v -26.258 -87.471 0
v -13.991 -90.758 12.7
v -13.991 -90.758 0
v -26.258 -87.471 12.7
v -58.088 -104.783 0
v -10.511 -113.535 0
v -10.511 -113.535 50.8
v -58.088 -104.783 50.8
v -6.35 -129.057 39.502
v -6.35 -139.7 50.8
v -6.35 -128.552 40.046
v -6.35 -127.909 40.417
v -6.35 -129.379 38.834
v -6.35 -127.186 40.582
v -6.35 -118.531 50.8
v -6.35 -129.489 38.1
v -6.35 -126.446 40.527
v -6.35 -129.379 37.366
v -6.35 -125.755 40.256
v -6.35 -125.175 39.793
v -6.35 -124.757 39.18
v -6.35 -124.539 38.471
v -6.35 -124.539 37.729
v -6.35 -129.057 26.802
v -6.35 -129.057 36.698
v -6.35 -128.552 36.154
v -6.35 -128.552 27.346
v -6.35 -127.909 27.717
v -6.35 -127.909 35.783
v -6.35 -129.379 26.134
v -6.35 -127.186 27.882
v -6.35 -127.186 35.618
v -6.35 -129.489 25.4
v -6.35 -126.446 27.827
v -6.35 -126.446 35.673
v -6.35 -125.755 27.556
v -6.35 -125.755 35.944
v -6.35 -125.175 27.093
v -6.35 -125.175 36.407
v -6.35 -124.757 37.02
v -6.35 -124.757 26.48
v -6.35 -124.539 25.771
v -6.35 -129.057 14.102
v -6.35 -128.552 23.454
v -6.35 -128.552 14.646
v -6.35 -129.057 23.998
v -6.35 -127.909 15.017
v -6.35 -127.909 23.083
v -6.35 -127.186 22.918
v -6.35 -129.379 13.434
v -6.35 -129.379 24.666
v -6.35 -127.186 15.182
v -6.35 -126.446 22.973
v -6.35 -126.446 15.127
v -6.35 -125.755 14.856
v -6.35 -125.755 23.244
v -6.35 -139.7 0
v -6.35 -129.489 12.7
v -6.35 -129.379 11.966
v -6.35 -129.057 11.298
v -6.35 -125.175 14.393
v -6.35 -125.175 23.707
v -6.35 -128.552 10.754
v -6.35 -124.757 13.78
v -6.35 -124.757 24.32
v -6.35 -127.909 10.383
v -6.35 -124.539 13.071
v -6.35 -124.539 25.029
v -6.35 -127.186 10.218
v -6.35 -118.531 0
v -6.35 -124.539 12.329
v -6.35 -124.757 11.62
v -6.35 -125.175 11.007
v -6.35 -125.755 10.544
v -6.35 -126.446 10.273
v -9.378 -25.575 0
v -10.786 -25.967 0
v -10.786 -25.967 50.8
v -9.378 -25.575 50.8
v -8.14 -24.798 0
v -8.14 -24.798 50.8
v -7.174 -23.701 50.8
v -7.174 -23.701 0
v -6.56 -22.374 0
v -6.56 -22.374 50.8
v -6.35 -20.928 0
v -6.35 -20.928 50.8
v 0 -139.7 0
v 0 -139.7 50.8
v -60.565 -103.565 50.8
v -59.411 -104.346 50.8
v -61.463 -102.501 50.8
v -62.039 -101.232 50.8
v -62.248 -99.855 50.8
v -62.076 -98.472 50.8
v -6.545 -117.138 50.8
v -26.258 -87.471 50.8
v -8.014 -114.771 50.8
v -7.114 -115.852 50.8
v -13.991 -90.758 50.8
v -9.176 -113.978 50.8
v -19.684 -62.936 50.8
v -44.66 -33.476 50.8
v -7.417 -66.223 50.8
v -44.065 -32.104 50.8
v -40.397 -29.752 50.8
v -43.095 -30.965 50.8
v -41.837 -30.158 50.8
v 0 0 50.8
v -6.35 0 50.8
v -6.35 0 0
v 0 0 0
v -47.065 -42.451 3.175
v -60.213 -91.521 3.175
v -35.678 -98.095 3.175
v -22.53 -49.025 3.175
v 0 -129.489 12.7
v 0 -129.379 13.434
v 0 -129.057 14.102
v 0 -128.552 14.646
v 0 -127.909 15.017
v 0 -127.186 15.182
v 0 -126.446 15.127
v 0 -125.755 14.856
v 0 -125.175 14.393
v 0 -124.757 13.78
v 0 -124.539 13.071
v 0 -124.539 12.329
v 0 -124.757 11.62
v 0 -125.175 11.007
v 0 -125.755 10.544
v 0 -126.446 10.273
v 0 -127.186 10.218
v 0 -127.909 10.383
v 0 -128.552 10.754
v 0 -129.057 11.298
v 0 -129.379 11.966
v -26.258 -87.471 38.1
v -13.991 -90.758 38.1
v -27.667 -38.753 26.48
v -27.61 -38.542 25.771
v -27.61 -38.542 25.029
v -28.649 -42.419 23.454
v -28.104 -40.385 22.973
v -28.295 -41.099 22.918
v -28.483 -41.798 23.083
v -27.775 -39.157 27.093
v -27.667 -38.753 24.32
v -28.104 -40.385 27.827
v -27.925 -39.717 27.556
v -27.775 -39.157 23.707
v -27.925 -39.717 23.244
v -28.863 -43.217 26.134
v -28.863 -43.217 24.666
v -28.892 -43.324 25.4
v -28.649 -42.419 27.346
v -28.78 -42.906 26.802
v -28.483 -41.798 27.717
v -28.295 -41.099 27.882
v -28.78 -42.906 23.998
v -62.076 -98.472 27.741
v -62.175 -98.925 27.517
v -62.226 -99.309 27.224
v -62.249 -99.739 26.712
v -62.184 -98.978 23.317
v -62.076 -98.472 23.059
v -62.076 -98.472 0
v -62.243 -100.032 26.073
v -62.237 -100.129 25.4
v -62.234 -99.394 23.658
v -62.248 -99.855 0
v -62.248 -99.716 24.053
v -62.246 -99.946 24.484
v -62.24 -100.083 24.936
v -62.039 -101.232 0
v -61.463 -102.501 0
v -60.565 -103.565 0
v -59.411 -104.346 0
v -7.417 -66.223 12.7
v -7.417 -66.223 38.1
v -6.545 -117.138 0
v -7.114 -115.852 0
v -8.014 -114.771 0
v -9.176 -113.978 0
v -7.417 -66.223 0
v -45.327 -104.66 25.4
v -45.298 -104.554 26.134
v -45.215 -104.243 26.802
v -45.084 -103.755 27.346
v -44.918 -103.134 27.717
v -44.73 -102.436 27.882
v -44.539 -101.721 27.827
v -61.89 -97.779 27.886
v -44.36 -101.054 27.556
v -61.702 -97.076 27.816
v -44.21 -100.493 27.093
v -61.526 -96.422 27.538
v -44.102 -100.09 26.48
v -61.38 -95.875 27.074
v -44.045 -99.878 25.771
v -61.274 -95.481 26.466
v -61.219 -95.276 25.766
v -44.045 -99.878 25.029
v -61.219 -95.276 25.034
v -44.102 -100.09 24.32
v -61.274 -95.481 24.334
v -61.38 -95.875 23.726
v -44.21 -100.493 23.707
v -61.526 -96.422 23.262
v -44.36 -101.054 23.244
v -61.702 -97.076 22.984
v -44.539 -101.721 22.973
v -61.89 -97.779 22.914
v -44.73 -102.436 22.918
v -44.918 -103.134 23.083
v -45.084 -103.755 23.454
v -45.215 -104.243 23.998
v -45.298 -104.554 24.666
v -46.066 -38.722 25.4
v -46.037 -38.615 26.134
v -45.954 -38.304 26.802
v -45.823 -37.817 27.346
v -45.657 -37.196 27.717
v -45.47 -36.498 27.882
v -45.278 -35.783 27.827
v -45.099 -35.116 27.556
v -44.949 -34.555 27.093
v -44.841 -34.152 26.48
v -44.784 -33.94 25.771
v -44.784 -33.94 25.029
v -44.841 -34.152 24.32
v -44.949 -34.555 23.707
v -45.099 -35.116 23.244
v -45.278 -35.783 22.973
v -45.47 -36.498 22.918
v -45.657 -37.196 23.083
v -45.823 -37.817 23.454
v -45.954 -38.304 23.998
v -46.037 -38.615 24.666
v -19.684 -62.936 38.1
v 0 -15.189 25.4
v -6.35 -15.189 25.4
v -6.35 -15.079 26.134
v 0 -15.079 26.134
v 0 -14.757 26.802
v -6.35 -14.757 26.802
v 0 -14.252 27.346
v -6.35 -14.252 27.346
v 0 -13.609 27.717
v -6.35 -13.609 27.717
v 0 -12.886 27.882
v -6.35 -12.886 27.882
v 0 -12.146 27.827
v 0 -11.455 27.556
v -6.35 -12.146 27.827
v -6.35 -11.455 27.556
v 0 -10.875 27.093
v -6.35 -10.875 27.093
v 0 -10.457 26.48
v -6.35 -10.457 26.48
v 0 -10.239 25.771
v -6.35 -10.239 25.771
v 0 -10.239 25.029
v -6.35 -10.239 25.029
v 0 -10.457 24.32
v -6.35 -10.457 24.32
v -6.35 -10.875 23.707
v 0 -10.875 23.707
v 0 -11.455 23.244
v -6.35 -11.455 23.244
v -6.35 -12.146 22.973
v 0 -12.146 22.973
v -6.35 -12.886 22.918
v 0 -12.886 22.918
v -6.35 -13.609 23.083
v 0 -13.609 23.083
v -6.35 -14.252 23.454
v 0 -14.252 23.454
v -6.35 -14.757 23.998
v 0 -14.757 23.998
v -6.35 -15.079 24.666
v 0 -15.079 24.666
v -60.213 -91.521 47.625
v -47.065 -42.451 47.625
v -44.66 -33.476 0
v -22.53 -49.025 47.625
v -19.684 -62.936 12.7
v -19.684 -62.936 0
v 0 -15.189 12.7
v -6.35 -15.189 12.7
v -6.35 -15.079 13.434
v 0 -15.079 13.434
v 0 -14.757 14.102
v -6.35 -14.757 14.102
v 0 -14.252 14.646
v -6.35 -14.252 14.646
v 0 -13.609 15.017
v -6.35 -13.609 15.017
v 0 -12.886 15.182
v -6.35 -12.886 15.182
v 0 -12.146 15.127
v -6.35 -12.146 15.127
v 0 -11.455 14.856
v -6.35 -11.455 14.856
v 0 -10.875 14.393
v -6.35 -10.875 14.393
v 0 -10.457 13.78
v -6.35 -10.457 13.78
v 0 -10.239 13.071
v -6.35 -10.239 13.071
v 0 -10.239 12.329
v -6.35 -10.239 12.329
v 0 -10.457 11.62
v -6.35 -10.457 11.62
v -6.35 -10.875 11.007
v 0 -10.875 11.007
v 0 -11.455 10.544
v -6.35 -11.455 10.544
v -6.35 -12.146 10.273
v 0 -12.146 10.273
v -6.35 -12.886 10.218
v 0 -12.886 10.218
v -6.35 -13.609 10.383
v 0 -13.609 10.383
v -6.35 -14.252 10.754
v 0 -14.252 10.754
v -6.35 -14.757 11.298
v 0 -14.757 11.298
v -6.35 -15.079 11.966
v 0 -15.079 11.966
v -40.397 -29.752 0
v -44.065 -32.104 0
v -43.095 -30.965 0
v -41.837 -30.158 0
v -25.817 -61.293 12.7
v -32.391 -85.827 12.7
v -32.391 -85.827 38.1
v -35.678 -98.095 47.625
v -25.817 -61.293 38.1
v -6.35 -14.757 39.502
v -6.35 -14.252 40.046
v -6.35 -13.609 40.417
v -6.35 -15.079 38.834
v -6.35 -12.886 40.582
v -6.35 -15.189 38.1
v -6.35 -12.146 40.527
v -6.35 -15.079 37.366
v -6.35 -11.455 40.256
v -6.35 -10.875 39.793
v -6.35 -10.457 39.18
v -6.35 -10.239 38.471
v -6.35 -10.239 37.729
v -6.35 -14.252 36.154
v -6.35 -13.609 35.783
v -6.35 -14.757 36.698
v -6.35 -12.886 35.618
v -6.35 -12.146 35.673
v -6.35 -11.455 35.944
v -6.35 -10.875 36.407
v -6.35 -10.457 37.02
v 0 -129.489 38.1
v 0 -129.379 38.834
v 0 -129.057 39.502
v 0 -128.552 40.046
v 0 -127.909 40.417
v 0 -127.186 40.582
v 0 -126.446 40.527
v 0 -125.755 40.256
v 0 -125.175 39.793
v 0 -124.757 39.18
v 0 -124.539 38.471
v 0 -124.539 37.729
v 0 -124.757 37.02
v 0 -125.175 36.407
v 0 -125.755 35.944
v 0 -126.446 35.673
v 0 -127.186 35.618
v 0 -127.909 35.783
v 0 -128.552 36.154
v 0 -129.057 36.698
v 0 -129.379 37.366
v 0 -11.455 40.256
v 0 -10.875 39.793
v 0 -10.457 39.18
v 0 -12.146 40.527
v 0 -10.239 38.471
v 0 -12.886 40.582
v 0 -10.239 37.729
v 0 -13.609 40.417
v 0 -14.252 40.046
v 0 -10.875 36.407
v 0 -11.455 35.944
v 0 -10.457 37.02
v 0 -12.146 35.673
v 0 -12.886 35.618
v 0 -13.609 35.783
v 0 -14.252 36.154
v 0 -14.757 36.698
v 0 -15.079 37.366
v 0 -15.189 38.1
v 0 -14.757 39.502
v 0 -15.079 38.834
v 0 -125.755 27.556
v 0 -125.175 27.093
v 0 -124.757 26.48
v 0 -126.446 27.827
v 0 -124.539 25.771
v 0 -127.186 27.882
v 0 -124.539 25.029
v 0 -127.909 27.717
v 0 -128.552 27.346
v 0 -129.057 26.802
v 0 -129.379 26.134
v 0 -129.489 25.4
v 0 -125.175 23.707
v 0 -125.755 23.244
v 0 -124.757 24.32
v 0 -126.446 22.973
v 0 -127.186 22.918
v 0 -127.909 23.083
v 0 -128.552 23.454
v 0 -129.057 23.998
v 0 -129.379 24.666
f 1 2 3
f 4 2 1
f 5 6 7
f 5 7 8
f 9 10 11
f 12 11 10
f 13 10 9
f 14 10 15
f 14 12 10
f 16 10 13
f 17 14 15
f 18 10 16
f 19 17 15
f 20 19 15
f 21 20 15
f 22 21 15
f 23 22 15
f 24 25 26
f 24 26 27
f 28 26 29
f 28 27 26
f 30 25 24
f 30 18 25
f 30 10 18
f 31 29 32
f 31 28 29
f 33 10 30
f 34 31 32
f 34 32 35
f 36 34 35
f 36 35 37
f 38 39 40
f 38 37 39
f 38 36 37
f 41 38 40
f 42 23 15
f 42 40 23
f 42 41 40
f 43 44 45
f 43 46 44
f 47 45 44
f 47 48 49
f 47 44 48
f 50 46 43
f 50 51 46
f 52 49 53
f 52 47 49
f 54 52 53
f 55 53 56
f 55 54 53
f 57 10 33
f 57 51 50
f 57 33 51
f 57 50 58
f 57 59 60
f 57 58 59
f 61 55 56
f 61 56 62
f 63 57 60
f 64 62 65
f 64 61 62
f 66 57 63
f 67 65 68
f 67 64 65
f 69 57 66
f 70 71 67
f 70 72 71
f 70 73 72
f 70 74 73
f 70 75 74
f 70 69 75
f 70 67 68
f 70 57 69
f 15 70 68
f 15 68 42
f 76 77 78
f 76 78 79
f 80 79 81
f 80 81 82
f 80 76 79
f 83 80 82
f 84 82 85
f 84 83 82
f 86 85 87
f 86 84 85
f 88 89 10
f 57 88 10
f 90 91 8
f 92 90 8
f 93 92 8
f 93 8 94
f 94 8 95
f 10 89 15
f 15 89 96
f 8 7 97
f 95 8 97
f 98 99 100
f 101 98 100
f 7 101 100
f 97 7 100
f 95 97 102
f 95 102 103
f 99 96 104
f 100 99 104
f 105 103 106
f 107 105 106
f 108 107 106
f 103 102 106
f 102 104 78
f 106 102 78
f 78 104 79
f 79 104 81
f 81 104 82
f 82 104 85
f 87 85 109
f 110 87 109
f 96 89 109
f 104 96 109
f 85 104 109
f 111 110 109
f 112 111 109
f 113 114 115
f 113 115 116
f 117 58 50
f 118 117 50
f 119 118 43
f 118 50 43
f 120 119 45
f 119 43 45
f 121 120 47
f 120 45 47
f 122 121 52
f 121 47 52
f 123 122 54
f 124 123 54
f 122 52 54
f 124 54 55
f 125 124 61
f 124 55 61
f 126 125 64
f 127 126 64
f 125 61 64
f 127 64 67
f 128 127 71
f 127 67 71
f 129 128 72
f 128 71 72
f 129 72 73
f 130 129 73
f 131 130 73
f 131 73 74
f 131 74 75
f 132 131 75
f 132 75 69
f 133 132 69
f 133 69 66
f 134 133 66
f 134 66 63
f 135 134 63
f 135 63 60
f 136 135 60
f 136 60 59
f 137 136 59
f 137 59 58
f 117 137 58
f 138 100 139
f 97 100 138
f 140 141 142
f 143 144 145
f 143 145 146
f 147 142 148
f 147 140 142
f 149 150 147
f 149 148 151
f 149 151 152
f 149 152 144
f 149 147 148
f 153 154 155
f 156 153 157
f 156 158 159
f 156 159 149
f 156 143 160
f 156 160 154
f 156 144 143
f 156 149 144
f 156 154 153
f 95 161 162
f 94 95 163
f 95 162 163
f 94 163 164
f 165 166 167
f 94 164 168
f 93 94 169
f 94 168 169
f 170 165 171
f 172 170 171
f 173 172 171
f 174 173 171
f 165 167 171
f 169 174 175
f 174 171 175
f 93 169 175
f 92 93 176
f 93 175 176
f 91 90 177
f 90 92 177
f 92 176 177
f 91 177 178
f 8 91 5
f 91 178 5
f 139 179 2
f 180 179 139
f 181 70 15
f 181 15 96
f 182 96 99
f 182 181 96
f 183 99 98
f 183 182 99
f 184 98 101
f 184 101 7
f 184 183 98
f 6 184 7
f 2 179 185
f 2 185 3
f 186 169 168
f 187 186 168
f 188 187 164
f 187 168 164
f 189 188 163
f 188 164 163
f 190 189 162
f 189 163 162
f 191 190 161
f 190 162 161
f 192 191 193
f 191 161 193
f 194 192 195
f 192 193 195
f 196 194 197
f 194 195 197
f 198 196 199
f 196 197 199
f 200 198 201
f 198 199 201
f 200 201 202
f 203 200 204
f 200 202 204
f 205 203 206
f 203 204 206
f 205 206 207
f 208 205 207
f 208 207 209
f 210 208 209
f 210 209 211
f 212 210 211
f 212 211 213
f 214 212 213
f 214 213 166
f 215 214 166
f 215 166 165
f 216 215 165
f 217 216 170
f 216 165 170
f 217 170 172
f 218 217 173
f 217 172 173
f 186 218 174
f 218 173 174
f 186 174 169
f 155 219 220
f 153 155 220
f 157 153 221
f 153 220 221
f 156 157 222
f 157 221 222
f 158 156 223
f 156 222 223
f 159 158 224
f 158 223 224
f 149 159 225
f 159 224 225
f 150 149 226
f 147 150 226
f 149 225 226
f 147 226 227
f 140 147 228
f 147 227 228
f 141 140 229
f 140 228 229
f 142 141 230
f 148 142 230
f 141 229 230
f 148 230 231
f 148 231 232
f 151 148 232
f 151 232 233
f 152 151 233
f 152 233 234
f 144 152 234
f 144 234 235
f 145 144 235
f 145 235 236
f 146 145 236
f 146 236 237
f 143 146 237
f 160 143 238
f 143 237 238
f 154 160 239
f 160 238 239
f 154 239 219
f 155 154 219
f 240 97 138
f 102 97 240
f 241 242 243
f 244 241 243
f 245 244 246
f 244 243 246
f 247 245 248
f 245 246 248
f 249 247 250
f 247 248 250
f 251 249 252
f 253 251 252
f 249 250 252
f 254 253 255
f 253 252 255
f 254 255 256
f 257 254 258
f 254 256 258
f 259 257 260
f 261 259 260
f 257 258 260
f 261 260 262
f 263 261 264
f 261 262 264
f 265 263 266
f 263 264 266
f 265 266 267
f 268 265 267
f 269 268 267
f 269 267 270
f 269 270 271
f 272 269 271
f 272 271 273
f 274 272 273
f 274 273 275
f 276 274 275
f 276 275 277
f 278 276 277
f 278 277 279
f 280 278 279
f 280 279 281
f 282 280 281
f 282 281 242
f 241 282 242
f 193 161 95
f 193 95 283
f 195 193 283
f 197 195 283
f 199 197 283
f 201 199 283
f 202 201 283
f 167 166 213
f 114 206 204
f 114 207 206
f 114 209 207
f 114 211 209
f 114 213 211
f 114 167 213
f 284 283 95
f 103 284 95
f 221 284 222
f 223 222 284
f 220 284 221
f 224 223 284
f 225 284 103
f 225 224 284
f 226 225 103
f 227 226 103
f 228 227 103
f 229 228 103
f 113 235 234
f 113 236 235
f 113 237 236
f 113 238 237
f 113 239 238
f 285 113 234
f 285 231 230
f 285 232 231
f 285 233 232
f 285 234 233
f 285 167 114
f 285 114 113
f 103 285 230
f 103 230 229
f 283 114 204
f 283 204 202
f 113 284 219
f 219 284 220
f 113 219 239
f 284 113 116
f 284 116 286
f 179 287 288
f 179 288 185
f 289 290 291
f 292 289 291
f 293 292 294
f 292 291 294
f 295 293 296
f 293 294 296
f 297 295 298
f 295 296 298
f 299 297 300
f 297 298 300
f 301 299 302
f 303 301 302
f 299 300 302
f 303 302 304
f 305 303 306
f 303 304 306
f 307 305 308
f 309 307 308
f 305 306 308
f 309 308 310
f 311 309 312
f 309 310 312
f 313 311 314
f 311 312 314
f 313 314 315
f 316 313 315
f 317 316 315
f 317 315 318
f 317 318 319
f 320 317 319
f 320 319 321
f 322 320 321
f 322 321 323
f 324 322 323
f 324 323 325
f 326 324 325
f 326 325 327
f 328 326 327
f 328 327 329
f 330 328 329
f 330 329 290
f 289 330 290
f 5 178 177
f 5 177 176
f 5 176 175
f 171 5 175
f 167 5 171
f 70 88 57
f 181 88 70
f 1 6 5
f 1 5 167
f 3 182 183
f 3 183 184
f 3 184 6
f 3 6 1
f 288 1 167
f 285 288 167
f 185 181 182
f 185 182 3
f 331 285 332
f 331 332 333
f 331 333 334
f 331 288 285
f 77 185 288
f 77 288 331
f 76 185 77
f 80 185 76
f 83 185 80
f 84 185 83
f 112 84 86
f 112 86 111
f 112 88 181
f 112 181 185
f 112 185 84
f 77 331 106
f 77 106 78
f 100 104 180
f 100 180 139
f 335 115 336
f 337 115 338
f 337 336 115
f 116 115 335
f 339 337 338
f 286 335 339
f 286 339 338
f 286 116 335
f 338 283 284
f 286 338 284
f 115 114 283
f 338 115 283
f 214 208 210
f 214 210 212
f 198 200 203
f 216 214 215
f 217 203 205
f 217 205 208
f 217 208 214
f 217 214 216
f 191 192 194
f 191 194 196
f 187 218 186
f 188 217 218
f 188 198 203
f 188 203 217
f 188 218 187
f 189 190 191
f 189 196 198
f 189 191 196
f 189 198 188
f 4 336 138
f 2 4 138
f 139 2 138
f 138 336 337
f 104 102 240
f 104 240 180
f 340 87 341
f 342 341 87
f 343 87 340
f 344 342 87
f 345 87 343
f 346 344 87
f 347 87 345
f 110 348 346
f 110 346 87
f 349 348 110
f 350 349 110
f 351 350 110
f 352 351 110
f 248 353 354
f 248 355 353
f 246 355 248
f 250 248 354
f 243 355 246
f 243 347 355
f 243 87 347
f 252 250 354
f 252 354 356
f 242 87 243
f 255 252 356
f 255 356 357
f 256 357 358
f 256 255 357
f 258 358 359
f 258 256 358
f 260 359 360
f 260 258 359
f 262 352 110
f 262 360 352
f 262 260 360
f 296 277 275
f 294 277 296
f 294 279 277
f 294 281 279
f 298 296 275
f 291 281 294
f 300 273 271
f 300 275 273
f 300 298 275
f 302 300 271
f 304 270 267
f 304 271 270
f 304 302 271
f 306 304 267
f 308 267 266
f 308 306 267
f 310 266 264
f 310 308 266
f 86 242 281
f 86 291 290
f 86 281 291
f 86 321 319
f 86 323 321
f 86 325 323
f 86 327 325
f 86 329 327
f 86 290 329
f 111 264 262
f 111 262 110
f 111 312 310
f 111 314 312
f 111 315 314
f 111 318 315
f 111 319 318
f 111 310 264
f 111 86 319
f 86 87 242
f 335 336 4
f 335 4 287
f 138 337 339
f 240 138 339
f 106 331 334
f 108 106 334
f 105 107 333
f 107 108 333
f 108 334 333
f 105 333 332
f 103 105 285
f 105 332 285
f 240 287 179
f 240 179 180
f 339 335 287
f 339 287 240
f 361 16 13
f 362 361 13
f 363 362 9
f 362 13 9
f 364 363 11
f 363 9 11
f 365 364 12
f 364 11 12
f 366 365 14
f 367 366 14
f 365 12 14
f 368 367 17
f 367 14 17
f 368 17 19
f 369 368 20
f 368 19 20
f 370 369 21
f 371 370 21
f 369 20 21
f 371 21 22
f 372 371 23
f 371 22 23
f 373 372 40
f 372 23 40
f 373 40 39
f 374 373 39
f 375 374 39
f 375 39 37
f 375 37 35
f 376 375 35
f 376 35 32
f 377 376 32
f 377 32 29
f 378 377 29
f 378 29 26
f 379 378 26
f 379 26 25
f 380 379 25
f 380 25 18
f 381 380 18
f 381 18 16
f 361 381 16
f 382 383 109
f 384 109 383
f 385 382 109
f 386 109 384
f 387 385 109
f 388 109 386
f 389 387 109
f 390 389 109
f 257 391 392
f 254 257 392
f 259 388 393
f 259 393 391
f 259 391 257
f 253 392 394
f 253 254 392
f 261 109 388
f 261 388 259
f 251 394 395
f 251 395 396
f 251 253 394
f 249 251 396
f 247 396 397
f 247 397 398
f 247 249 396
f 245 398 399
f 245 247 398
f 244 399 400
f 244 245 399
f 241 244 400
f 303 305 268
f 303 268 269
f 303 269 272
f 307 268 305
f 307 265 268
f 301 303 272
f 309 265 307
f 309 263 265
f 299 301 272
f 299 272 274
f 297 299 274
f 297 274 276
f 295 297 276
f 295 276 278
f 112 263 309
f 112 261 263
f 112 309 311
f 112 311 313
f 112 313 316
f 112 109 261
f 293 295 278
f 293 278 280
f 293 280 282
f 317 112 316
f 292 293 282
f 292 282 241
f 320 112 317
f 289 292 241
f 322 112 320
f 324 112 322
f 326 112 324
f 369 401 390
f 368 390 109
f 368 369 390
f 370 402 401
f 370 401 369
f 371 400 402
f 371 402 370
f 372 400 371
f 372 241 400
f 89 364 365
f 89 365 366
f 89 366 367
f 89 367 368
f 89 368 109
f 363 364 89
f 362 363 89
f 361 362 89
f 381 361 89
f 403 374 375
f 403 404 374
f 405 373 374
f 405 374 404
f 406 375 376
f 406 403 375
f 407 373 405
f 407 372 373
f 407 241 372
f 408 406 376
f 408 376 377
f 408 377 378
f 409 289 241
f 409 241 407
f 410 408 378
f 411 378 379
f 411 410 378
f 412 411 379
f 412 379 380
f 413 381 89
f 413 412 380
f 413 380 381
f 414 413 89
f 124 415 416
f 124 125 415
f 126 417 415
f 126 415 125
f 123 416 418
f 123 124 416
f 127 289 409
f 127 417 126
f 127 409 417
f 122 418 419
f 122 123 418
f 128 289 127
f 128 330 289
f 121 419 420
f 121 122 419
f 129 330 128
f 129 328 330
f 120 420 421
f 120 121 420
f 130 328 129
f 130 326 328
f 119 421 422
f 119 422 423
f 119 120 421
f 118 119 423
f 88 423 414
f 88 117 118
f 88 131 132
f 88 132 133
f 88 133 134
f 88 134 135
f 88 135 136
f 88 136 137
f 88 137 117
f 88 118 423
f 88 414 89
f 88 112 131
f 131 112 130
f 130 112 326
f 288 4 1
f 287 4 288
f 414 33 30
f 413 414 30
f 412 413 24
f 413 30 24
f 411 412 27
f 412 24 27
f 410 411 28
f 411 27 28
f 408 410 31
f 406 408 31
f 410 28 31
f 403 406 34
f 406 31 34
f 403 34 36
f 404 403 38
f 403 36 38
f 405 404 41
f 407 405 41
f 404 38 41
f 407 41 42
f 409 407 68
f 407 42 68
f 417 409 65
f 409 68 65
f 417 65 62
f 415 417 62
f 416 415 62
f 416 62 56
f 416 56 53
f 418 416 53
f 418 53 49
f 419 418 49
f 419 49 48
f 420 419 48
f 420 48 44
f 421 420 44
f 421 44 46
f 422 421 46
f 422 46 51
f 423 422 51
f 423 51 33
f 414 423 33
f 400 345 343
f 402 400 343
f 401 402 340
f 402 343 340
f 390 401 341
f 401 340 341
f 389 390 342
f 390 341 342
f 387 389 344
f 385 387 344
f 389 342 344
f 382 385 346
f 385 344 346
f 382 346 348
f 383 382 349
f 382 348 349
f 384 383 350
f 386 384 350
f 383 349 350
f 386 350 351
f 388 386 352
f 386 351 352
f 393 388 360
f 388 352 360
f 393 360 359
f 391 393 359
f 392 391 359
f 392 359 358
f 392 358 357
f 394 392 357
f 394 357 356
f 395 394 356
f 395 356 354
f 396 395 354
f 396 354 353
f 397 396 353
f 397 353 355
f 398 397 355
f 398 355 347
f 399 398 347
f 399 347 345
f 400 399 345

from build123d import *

# Parameters (mm, degrees)
BOSS_EXTRUDE1_DEPTH     = 50.8
SKETCH3_W               = 44.45
SKETCH3_H               = 50.8
CUT_EXTRUDE1_DEPTH      = 25.4
SKETCH4_R               = 2.4892
CUT_EXTRUDE2_DEPTH      = 17.78
SKETCH7_W               = 25.4
SKETCH7_H               = 25.4
CUT_EXTRUDE3_DEPTH      = 19.05
CUT_EXTRUDE4_DEPTH      = 159.113724894
CUT_EXTRUDE4_DEPTH_BACK = 159.113724894
SKETCH10_R              = 2.4892
CUT_EXTRUDE5_DEPTH      = 160.257189791
FILLET1_R               = 5.08


with BuildPart() as part:
    # Sketch1 → Boss-Extrude1 (new body)
    with BuildSketch(Plane.XY):
        Polygon((0, 0), (0, -139.7), (-6.35, -139.7), (-6.35, -114.3), (-63.5, -103.787780153), (-43.777988763, -30.184232189), (-6.35, -25.4), (-6.35, 0), align=None)
    extrude(amount=BOSS_EXTRUDE1_DEPTH)

    # Sketch3 → Cut-Extrude1 (cut)
    with BuildSketch(Plane(origin=(-33.299361532, 8.922537031, 0), x_dir=(0, 0, 1), z_dir=(-0.9659258262890682, 0.2588190451025214, 0))):
        with Locations((25.4, -78.586306667)):
            Rectangle(SKETCH3_W, SKETCH3_H)
    extrude(amount=-CUT_EXTRUDE1_DEPTH, mode=Mode.SUBTRACT)

    # Sketch4 → Cut-Extrude2 (cut)
    with BuildSketch(Plane(origin=(-33.299361532, 8.922537031, 0), x_dir=(0, 0, 1), z_dir=(-0.9659258262890682, 0.2588190451025214, 0))):
        with Locations(Location((25.4, -46.836306667, 0), (0, 0, 270))):
            Circle(SKETCH4_R)
        with Locations(Location((25.4, -110.336306667, 0), (0, 0, 270))):
            Circle(SKETCH4_R)
    extrude(amount=-CUT_EXTRUDE2_DEPTH, mode=Mode.SUBTRACT)

    # Sketch7 → Cut-Extrude3 (cut)
    with BuildSketch(Plane(origin=(-8.764845544, 2.348533285, 0), x_dir=(0, 0, 1), z_dir=(-0.9659258262890681, 0.25881904510252124, 0))):
        with Locations((25.4, -78.586306667)):
            Rectangle(SKETCH7_W, SKETCH7_H)
    extrude(amount=-CUT_EXTRUDE3_DEPTH, mode=Mode.SUBTRACT)

    # Sketch9 → Cut-Extrude4 (cut, two sides: drawn at the far end of the back side and taken through both)
    with BuildSketch(Plane(origin=(0, 0, 38.1), x_dir=(-1, 0, 0), z_dir=(0, 0, -1)).offset(-CUT_EXTRUDE4_DEPTH_BACK)):
        Polygon((7.41658953, -66.223254732), (13.990593276, -90.75777072), (26.25785127, -87.470768847), (19.683847524, -62.936252859), align=None)
    extrude(amount=CUT_EXTRUDE4_DEPTH + CUT_EXTRUDE4_DEPTH_BACK, mode=Mode.SUBTRACT)

    # Sketch10 → Cut-Extrude5 (cut, through all)
    with BuildSketch(Plane.ZY.offset(6.35)):
        with Locations(Location((25.4, -12.7, 0), (0, 0, 270))):
            Circle(SKETCH10_R)
        with Locations(Location((12.7, -12.7, 0), (0, 0, 270))):
            Circle(SKETCH10_R)
        with Locations(Location((12.7, -127, 0), (0, 0, 270))):
            Circle(SKETCH10_R)
        with Locations(Location((38.1, -127, 0), (0, 0, 270))):
            Circle(SKETCH10_R)
        with Locations(Location((38.1, -12.7, 0), (0, 0, 270))):
            Circle(SKETCH10_R)
        with Locations(Location((25.4, -127, 0), (0, 0, 270))):
            Circle(SKETCH10_R)
    extrude(amount=-CUT_EXTRUDE5_DEPTH, mode=Mode.SUBTRACT)

    # Fillet1
    # the kernel refuses this fillet: 5.08 mm, written as the material it adds along each edge
    with BuildSketch(Plane(origin=(-6.35, -25.4, 0), x_dir=(0, 1, 0), z_dir=(0, 0, 1))) as fillet1_piece_1:
        with BuildLine():
            CenterArc((FILLET1_R * 0.880311524947, FILLET1_R), FILLET1_R, 187.284330246, 82.715669754)
            Line((-FILLET1_R * 0.111617631295, FILLET1_R * 0.873206668172), (0, 0))
            Line((0, 0), (FILLET1_R * 0.880311524947, 0))
        make_face()
    extrude(amount=50.8)
    with BuildSketch(Plane(origin=(-6.35, -114.3, 0), x_dir=(0, -1, 0), z_dir=(0, 0, 1))) as fillet1_piece_2:
        with BuildLine():
            CenterArc((FILLET1_R * 0.832835540577, -FILLET1_R), FILLET1_R, 90, 79.57746931)
            Line((-FILLET1_R * 0.150664867797, -FILLET1_R * 0.819094094265), (0, 0))
            Line((0, 0), (FILLET1_R * 0.832835540577, 0))
        make_face()
    extrude(amount=50.8)
    # the kernel refuses this fillet: 5.08 mm, written as the material it takes off along each edge
    with BuildSketch(Plane(origin=(-43.777988763, -30.184232189, -8.520486112), x_dir=(0.9919291562424372, 0.12679333182847863, 0), z_dir=(0, 0, 1))) as fillet1_2_piece_1:
        with BuildLine():
            CenterArc((FILLET1_R * 0.670904418298, -FILLET1_R), FILLET1_R, 90, 67.715669754)
            Line((-FILLET1_R * 0.254409042496, -FILLET1_R * 0.620796889158), (0, 0))
            Line((0, 0), (FILLET1_R * 0.670904418298, 0))
        make_face()
    extrude(amount=67.840972225, mode=Mode.SUBTRACT)
    with BuildSketch(Plane(origin=(-63.5, -103.787780153, -13.757429812), x_dir=(0.983500408373109, -0.18090590573535092, 0), z_dir=(0, 0, 1))) as fillet1_2_piece_2:
        with BuildLine():
            CenterArc((FILLET1_R * 1.0832621899, FILLET1_R), FILLET1_R, 175.42253069, 94.57746931)
            Line((FILLET1_R * 0.0864518515073, FILLET1_R * 1.07980695008), (0, 0))
            Line((0, 0), (FILLET1_R * 1.0832621899, 0))
        make_face()
    extrude(amount=78.314859623, mode=Mode.SUBTRACT)


solid = part.part
